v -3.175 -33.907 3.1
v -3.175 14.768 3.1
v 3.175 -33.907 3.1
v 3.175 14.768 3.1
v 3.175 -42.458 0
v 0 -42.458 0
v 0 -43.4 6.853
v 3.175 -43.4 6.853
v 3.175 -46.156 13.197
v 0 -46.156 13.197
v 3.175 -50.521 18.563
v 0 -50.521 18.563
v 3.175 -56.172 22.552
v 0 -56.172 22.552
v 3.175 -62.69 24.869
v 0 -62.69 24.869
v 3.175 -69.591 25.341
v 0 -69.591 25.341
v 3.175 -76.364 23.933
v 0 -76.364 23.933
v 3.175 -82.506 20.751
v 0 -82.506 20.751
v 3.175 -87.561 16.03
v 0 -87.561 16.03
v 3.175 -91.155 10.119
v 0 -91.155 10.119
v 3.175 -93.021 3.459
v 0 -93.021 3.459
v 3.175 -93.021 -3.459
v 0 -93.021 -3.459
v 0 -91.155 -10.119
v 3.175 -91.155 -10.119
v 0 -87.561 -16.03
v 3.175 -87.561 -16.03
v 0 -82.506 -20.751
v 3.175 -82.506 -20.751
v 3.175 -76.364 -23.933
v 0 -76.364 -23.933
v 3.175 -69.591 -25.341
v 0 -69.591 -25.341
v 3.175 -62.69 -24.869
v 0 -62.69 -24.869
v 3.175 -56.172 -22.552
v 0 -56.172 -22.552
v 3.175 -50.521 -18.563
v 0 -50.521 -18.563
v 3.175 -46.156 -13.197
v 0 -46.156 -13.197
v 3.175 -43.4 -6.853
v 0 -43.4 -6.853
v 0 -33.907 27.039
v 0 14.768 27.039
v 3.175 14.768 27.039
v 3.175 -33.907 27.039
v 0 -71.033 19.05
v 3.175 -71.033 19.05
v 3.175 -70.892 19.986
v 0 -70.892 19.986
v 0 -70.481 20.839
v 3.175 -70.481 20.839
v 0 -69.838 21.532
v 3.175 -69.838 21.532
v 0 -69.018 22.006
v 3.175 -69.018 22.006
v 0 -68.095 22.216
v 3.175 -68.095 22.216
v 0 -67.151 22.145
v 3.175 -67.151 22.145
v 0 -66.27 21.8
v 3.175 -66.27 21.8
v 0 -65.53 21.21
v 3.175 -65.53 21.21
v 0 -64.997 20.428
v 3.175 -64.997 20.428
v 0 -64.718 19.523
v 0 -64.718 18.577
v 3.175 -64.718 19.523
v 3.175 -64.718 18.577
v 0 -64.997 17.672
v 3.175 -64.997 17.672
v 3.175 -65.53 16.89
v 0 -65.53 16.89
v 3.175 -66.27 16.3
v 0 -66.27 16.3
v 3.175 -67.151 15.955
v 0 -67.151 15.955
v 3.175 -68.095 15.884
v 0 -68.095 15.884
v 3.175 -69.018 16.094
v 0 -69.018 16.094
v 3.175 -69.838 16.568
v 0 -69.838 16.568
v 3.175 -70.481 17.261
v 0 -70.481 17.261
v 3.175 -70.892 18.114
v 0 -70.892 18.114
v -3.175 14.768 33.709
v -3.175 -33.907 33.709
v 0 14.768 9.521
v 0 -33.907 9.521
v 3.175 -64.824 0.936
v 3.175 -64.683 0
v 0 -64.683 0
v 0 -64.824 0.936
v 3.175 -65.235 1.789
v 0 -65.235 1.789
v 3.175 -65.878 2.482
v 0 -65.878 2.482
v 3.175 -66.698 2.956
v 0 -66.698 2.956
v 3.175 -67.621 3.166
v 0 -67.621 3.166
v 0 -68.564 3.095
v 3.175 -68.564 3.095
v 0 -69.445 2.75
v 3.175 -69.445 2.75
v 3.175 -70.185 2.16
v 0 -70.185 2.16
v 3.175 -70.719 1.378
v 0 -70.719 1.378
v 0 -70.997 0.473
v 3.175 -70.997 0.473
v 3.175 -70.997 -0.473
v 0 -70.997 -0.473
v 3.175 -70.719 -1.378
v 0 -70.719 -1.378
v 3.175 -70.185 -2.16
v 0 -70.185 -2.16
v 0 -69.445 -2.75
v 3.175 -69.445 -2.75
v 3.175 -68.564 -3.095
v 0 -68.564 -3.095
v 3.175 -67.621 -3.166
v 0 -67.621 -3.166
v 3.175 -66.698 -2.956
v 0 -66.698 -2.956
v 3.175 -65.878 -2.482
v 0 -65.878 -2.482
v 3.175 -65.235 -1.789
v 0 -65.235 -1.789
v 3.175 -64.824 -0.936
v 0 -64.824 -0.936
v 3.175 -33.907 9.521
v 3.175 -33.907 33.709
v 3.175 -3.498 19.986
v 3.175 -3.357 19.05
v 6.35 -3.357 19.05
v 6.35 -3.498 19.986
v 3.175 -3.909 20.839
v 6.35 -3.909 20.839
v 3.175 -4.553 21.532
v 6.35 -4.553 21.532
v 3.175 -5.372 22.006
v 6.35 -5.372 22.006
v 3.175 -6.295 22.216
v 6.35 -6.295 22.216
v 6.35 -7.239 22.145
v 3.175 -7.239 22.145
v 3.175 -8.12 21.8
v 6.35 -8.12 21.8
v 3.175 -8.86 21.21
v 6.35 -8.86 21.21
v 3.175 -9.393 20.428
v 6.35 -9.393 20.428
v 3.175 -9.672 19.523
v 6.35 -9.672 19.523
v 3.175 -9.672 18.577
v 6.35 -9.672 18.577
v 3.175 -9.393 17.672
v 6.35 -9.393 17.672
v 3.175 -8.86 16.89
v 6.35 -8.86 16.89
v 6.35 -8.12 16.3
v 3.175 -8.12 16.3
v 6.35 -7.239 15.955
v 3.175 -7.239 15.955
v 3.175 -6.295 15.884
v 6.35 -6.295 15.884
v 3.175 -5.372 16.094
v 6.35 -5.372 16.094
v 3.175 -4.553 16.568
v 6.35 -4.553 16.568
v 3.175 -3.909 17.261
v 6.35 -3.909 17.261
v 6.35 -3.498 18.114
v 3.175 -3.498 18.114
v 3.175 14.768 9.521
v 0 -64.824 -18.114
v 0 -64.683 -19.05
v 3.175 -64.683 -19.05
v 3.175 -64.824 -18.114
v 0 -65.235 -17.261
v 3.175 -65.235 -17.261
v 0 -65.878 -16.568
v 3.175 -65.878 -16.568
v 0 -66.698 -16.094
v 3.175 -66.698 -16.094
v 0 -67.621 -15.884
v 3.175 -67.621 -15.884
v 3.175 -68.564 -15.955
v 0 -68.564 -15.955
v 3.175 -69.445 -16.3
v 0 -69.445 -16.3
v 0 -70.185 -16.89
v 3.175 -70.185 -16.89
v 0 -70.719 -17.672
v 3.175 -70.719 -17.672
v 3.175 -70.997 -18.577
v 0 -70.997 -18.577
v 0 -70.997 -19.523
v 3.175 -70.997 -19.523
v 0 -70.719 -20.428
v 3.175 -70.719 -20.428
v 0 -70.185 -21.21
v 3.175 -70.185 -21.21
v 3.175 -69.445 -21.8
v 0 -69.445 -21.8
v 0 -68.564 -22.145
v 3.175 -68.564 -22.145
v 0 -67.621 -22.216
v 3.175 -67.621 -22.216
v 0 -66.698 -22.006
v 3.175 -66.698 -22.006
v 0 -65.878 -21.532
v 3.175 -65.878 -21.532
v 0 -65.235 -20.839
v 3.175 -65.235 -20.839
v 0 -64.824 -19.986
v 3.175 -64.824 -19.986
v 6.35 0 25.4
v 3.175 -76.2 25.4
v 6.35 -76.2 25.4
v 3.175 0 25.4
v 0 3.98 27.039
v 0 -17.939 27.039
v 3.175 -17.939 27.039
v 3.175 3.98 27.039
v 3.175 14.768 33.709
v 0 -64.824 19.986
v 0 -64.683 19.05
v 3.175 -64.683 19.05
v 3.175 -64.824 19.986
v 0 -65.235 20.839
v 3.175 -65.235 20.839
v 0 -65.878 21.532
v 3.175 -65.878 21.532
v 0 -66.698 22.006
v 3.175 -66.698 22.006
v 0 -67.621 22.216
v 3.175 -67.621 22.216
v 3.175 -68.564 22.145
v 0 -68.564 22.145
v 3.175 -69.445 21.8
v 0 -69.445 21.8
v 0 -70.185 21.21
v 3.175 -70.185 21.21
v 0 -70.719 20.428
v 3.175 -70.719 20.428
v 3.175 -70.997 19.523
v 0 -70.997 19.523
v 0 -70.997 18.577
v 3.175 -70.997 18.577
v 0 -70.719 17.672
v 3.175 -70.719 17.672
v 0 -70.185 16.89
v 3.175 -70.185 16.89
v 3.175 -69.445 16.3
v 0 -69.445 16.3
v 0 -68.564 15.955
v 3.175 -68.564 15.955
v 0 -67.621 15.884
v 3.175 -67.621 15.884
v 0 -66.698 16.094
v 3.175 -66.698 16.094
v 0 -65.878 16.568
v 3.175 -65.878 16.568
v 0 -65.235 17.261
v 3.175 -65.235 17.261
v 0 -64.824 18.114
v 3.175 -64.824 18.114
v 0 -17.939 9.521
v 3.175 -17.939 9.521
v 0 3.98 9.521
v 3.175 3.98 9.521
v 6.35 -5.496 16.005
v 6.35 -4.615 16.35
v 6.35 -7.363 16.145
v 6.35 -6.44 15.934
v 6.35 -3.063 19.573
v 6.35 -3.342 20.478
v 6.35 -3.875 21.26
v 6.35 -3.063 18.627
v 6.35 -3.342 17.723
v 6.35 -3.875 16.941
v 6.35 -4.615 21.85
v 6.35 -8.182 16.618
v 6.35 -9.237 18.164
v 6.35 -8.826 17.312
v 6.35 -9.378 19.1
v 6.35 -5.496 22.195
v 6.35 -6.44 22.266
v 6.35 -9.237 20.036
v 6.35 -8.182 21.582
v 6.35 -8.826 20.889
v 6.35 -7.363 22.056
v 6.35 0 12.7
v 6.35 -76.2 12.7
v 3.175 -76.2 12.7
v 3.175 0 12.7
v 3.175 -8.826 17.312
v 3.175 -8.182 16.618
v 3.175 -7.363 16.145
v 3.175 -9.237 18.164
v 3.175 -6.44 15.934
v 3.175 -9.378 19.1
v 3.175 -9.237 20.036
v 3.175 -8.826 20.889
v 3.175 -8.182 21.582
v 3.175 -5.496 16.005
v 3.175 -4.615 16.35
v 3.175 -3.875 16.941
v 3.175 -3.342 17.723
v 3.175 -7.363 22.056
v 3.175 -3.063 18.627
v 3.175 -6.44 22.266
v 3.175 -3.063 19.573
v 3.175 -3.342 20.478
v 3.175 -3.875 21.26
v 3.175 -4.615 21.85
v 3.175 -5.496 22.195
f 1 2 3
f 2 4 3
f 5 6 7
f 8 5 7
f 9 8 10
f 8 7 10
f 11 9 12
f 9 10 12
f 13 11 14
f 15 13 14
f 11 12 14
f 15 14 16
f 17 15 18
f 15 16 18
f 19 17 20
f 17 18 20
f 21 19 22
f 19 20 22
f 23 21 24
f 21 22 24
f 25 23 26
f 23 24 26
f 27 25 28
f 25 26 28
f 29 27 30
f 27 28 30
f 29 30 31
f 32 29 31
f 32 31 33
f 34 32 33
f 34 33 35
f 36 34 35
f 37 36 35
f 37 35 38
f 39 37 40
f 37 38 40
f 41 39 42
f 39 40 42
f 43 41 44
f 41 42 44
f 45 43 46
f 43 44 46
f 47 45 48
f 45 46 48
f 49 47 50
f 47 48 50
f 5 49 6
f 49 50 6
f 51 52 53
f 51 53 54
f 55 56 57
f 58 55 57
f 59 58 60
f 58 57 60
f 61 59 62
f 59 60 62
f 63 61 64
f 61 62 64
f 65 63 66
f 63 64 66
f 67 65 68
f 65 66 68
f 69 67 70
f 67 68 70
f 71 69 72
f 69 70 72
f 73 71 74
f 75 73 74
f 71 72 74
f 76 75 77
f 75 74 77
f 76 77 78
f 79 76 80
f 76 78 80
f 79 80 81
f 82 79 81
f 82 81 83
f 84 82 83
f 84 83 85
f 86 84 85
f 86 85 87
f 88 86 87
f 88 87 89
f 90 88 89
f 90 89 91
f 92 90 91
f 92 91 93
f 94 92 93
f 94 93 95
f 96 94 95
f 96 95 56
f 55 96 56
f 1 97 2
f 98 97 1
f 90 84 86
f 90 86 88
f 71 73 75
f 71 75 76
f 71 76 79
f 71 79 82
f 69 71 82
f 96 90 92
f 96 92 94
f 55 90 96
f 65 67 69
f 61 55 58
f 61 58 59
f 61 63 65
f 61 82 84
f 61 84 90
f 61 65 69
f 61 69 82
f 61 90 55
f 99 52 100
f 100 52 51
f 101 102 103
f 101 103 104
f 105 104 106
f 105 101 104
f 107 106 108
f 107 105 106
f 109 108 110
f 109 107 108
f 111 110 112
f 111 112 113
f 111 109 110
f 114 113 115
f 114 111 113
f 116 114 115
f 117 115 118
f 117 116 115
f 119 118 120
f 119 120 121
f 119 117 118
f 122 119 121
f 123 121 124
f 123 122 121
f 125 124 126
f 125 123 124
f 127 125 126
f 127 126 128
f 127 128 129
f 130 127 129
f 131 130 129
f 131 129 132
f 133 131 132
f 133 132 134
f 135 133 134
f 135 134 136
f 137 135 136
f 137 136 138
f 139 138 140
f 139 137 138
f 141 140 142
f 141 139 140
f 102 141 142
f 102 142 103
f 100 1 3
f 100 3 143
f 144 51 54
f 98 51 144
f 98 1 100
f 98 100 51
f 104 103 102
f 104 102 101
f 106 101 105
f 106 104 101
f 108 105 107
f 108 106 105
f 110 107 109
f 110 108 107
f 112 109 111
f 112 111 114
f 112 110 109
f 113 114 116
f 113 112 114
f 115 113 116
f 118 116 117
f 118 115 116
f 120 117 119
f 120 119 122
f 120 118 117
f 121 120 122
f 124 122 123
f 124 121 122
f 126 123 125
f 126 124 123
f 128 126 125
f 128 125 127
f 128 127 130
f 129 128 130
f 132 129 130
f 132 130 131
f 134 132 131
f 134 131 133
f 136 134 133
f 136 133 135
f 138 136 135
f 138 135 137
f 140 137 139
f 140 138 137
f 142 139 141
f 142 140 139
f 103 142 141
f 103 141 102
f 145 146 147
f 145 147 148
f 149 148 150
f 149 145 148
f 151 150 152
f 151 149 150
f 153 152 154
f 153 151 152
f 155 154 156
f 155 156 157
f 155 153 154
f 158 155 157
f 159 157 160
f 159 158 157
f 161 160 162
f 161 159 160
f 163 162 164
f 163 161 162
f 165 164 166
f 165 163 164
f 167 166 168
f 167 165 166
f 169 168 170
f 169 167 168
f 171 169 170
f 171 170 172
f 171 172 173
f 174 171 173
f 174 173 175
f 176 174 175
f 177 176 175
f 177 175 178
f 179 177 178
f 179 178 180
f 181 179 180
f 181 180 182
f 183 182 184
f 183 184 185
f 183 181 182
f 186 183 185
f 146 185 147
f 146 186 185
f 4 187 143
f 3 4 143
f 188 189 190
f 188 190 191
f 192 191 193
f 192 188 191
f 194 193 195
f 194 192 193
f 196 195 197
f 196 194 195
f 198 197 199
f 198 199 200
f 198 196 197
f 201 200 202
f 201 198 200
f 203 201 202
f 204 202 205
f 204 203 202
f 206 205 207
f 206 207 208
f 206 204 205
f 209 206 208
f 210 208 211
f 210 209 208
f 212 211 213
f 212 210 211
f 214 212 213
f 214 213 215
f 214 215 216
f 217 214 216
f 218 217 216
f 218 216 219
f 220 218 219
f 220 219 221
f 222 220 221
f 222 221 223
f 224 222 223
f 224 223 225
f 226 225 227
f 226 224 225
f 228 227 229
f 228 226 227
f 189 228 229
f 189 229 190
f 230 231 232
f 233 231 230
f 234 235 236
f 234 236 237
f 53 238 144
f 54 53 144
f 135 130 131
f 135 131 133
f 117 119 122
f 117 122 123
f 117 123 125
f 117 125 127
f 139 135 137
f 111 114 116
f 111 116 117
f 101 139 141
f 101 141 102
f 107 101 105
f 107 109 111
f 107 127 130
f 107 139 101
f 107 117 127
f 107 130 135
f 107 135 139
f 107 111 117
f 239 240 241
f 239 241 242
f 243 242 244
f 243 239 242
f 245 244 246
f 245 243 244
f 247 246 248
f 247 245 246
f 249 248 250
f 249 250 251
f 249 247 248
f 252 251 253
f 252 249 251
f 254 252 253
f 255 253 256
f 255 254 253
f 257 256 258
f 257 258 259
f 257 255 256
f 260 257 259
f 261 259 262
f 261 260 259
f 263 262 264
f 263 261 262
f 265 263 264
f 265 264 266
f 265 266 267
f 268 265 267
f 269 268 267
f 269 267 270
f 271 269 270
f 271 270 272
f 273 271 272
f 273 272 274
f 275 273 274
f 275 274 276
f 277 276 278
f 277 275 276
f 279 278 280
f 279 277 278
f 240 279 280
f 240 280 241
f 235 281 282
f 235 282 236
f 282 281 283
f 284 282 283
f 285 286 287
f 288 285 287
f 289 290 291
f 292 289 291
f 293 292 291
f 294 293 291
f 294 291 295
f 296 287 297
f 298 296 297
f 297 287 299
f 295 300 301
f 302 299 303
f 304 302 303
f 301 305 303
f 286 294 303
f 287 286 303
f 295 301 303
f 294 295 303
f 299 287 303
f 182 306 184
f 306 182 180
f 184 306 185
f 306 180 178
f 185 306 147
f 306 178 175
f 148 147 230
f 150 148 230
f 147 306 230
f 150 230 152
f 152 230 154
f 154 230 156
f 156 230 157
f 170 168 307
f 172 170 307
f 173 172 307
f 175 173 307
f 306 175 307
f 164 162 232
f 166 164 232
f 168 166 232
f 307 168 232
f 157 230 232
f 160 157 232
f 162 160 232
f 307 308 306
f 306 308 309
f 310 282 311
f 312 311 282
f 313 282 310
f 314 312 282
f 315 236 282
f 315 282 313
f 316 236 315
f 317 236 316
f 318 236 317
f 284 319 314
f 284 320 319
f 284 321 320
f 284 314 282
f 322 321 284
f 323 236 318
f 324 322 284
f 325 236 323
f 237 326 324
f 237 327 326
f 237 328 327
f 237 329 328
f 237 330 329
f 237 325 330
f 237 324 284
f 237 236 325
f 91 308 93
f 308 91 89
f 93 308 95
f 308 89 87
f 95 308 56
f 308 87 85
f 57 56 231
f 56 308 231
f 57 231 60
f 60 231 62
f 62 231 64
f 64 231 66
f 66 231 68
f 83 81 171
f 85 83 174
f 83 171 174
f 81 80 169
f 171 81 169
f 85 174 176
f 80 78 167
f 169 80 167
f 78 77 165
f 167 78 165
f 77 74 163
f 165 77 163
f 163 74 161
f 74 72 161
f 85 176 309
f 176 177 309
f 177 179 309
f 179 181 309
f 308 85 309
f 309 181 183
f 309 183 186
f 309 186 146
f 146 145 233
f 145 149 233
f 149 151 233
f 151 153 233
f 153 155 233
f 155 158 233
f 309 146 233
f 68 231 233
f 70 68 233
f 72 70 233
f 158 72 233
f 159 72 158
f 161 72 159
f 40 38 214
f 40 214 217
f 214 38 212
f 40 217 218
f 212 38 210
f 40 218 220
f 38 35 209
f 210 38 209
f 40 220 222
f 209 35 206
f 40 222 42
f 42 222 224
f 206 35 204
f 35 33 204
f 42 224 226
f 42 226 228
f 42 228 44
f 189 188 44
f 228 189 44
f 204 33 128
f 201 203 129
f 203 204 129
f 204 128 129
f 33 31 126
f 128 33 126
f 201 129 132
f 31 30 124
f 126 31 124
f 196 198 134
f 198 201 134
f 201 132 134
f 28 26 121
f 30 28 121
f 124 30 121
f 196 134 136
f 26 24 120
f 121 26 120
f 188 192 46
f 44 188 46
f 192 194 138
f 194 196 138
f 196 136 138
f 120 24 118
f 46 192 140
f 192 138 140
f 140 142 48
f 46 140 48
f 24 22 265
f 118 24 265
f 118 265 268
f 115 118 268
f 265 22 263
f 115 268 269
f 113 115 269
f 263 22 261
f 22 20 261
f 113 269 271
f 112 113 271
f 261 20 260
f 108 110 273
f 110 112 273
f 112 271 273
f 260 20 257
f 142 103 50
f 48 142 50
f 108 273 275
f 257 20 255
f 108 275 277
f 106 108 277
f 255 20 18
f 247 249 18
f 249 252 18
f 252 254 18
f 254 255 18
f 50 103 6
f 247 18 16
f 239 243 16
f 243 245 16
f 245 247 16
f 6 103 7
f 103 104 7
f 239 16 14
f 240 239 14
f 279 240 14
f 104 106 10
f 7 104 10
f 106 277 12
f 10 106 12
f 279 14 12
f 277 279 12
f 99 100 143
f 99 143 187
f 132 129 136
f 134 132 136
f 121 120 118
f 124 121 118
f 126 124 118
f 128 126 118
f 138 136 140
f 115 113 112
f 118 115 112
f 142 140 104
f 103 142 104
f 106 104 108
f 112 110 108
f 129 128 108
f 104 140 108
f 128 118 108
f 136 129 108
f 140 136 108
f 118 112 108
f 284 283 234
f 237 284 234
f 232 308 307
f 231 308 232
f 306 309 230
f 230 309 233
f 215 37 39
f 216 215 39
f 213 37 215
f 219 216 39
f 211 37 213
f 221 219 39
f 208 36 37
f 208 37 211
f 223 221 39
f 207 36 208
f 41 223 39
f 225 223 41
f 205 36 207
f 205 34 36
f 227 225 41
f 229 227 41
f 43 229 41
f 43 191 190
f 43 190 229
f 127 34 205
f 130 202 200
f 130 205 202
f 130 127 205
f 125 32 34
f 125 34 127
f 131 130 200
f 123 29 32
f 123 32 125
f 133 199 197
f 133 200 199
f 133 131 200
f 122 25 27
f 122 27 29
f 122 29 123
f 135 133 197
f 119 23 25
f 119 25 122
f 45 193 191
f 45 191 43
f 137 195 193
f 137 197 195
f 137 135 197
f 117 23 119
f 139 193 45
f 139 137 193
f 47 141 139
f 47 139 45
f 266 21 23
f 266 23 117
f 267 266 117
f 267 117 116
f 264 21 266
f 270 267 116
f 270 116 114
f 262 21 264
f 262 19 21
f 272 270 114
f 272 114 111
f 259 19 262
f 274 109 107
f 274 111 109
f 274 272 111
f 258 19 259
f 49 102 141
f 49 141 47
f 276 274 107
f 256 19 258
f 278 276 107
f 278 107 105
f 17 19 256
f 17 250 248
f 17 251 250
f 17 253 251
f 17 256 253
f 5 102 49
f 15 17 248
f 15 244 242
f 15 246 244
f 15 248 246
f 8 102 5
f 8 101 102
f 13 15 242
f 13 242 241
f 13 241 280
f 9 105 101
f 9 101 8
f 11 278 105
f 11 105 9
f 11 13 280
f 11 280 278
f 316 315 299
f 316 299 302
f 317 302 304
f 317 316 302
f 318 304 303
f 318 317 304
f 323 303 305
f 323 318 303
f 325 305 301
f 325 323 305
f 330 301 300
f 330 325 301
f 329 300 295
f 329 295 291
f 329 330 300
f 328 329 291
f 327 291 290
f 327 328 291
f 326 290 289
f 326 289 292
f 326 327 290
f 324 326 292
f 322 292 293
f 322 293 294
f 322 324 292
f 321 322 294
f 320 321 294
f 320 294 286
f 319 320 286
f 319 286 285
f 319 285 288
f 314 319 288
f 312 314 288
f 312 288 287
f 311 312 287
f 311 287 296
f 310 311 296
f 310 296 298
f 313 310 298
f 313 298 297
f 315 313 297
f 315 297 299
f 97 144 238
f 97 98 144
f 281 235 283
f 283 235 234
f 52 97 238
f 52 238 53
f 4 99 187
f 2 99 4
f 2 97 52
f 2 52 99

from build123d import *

# Parameters (mm, degrees)
F0_R          = 25.4
F0_R_2        = 3.175
F1_DEPTH      = 3.175
F2_R          = 3.175
F3_DEPTH      = 3.175
F4_W          = 76.2
F4_H          = 12.7
F4_R          = 3.175
F5_DEPTH      = 3.175
F6_R          = 3.175
F7_DEPTH      = 3.175
F7_DEPTH_BACK = 3.175
F8_W          = 21.9192807563
F8_H          = 17.51816459
F8_R          = 3.175
F9_DEPTH      = 3.175
F10_R         = 3.175
F11_DEPTH     = 6.35
F13_W         = 48.6749447882
F13_H         = 6.6694635898
F13_H_2       = 17.51816459
F13_H_3       = 6.4215252642
F14_DEPTH     = 3.175
F15_DEPTH     = 3.175


with BuildPart() as f1:
    # F0 (on Right) → F1 (new body)
    with BuildSketch(Plane.YZ):
        with Locations((-67.8579392607, 0)):
            Circle(F0_R)
        with Locations((-67.8579392607, 0)):
            Circle(F0_R_2, mode=Mode.SUBTRACT)
        with Locations((-67.8579392607, -19.0500002354)):
            Circle(F0_R_2, mode=Mode.SUBTRACT)
        with Locations((-67.8579392607, 19.0500002354)):
            Circle(F0_R_2, mode=Mode.SUBTRACT)
    extrude(amount=F1_DEPTH)


with BuildPart() as f3:
    # F2 (on face) → F3 (new body)
    with BuildSketch(Plane.YZ.offset(3.175)):
        with Locations((-67.8579392607, 0)):
            Circle(F2_R)
    extrude(amount=-F3_DEPTH)


with BuildPart() as f5:
    # F4 (on face) → F5 (new body)
    with BuildSketch(Plane.YZ.offset(3.175)):
        with Locations((-38.1, 19.05)):
            Rectangle(F4_W, F4_H)
        with Locations((-67.8579392607, 19.0500002354)):
            Circle(F4_R, mode=Mode.SUBTRACT)
        with Locations((-6.5324339084, 19.05)):
            Circle(F4_R, mode=Mode.SUBTRACT)
    extrude(amount=F5_DEPTH)

    # F6 (on face) → F7 (join, two sides)
    with BuildSketch(Plane(origin=(3.175, 0, 0), x_dir=(0, -1, 0), z_dir=(-1, 0, 0))) as f7_sk:
        with Locations((67.8579392607, 19.0500002354)):
            Circle(F6_R)
    extrude(amount=F7_DEPTH)
    extrude(f7_sk.sketch, amount=-F7_DEPTH_BACK)


with BuildPart() as f9:
    # F8 (on Right) → F9 (new body)
    with BuildSketch(Plane.YZ):
        with Locations((-6.9793609437, 18.2802686468)):
            Rectangle(F8_W, F8_H)
        with Locations((-6.2026930973, 19.1000849009)):
            Circle(F8_R, mode=Mode.SUBTRACT)
    extrude(amount=F9_DEPTH)

    # F10 (on face) → F11 (join)
    with BuildSketch(Plane(origin=(0, 0, 0), x_dir=(0, -1, 0), z_dir=(-1, 0, 0))):
        with Locations((6.2026930973, 19.1000849009)):
            Circle(F10_R)
    extrude(amount=-F11_DEPTH)

    # F12: union 


with BuildPart() as f14:
    # F13 (on face) → F14 (new body)
    with BuildSketch(Plane(origin=(0, 0, 0), x_dir=(0, -1, 0), z_dir=(-1, 0, 0))):
        with Locations((9.5699708909, 30.3740827367)):
            Rectangle(F13_W, F13_H)
        with Locations((9.5699708909, 18.2802686468)):
            Rectangle(F13_W, F13_H_2)
        with Locations((9.5699708909, 6.3104237197)):
            Rectangle(F13_W, F13_H_3)
    extrude(amount=F14_DEPTH)

    # F13 (on face) → F15 (join)
    with BuildSketch(Plane(origin=(0, 0, 0), x_dir=(0, -1, 0), z_dir=(-1, 0, 0))):
        Polygon((33.907443285, 33.7088145316), (-14.7675015032, 33.7088145316), (-14.7675015032, 27.0393509418), (-3.9802794345, 27.0393509418), (17.9390013218, 27.0393509418), (33.907443285, 27.0393509418), align=None)
        Polygon((-3.9802794345, 9.5211863518), (-14.7675015032, 9.5211863518), (-14.7675015032, 3.0996610876), (33.907443285, 3.0996610876), (33.907443285, 9.5211863518), (17.9390013218, 9.5211863518), align=None)
    extrude(amount=-F15_DEPTH)


solid = Compound([f1.part, f3.part, f5.part, f9.part, f14.part])
